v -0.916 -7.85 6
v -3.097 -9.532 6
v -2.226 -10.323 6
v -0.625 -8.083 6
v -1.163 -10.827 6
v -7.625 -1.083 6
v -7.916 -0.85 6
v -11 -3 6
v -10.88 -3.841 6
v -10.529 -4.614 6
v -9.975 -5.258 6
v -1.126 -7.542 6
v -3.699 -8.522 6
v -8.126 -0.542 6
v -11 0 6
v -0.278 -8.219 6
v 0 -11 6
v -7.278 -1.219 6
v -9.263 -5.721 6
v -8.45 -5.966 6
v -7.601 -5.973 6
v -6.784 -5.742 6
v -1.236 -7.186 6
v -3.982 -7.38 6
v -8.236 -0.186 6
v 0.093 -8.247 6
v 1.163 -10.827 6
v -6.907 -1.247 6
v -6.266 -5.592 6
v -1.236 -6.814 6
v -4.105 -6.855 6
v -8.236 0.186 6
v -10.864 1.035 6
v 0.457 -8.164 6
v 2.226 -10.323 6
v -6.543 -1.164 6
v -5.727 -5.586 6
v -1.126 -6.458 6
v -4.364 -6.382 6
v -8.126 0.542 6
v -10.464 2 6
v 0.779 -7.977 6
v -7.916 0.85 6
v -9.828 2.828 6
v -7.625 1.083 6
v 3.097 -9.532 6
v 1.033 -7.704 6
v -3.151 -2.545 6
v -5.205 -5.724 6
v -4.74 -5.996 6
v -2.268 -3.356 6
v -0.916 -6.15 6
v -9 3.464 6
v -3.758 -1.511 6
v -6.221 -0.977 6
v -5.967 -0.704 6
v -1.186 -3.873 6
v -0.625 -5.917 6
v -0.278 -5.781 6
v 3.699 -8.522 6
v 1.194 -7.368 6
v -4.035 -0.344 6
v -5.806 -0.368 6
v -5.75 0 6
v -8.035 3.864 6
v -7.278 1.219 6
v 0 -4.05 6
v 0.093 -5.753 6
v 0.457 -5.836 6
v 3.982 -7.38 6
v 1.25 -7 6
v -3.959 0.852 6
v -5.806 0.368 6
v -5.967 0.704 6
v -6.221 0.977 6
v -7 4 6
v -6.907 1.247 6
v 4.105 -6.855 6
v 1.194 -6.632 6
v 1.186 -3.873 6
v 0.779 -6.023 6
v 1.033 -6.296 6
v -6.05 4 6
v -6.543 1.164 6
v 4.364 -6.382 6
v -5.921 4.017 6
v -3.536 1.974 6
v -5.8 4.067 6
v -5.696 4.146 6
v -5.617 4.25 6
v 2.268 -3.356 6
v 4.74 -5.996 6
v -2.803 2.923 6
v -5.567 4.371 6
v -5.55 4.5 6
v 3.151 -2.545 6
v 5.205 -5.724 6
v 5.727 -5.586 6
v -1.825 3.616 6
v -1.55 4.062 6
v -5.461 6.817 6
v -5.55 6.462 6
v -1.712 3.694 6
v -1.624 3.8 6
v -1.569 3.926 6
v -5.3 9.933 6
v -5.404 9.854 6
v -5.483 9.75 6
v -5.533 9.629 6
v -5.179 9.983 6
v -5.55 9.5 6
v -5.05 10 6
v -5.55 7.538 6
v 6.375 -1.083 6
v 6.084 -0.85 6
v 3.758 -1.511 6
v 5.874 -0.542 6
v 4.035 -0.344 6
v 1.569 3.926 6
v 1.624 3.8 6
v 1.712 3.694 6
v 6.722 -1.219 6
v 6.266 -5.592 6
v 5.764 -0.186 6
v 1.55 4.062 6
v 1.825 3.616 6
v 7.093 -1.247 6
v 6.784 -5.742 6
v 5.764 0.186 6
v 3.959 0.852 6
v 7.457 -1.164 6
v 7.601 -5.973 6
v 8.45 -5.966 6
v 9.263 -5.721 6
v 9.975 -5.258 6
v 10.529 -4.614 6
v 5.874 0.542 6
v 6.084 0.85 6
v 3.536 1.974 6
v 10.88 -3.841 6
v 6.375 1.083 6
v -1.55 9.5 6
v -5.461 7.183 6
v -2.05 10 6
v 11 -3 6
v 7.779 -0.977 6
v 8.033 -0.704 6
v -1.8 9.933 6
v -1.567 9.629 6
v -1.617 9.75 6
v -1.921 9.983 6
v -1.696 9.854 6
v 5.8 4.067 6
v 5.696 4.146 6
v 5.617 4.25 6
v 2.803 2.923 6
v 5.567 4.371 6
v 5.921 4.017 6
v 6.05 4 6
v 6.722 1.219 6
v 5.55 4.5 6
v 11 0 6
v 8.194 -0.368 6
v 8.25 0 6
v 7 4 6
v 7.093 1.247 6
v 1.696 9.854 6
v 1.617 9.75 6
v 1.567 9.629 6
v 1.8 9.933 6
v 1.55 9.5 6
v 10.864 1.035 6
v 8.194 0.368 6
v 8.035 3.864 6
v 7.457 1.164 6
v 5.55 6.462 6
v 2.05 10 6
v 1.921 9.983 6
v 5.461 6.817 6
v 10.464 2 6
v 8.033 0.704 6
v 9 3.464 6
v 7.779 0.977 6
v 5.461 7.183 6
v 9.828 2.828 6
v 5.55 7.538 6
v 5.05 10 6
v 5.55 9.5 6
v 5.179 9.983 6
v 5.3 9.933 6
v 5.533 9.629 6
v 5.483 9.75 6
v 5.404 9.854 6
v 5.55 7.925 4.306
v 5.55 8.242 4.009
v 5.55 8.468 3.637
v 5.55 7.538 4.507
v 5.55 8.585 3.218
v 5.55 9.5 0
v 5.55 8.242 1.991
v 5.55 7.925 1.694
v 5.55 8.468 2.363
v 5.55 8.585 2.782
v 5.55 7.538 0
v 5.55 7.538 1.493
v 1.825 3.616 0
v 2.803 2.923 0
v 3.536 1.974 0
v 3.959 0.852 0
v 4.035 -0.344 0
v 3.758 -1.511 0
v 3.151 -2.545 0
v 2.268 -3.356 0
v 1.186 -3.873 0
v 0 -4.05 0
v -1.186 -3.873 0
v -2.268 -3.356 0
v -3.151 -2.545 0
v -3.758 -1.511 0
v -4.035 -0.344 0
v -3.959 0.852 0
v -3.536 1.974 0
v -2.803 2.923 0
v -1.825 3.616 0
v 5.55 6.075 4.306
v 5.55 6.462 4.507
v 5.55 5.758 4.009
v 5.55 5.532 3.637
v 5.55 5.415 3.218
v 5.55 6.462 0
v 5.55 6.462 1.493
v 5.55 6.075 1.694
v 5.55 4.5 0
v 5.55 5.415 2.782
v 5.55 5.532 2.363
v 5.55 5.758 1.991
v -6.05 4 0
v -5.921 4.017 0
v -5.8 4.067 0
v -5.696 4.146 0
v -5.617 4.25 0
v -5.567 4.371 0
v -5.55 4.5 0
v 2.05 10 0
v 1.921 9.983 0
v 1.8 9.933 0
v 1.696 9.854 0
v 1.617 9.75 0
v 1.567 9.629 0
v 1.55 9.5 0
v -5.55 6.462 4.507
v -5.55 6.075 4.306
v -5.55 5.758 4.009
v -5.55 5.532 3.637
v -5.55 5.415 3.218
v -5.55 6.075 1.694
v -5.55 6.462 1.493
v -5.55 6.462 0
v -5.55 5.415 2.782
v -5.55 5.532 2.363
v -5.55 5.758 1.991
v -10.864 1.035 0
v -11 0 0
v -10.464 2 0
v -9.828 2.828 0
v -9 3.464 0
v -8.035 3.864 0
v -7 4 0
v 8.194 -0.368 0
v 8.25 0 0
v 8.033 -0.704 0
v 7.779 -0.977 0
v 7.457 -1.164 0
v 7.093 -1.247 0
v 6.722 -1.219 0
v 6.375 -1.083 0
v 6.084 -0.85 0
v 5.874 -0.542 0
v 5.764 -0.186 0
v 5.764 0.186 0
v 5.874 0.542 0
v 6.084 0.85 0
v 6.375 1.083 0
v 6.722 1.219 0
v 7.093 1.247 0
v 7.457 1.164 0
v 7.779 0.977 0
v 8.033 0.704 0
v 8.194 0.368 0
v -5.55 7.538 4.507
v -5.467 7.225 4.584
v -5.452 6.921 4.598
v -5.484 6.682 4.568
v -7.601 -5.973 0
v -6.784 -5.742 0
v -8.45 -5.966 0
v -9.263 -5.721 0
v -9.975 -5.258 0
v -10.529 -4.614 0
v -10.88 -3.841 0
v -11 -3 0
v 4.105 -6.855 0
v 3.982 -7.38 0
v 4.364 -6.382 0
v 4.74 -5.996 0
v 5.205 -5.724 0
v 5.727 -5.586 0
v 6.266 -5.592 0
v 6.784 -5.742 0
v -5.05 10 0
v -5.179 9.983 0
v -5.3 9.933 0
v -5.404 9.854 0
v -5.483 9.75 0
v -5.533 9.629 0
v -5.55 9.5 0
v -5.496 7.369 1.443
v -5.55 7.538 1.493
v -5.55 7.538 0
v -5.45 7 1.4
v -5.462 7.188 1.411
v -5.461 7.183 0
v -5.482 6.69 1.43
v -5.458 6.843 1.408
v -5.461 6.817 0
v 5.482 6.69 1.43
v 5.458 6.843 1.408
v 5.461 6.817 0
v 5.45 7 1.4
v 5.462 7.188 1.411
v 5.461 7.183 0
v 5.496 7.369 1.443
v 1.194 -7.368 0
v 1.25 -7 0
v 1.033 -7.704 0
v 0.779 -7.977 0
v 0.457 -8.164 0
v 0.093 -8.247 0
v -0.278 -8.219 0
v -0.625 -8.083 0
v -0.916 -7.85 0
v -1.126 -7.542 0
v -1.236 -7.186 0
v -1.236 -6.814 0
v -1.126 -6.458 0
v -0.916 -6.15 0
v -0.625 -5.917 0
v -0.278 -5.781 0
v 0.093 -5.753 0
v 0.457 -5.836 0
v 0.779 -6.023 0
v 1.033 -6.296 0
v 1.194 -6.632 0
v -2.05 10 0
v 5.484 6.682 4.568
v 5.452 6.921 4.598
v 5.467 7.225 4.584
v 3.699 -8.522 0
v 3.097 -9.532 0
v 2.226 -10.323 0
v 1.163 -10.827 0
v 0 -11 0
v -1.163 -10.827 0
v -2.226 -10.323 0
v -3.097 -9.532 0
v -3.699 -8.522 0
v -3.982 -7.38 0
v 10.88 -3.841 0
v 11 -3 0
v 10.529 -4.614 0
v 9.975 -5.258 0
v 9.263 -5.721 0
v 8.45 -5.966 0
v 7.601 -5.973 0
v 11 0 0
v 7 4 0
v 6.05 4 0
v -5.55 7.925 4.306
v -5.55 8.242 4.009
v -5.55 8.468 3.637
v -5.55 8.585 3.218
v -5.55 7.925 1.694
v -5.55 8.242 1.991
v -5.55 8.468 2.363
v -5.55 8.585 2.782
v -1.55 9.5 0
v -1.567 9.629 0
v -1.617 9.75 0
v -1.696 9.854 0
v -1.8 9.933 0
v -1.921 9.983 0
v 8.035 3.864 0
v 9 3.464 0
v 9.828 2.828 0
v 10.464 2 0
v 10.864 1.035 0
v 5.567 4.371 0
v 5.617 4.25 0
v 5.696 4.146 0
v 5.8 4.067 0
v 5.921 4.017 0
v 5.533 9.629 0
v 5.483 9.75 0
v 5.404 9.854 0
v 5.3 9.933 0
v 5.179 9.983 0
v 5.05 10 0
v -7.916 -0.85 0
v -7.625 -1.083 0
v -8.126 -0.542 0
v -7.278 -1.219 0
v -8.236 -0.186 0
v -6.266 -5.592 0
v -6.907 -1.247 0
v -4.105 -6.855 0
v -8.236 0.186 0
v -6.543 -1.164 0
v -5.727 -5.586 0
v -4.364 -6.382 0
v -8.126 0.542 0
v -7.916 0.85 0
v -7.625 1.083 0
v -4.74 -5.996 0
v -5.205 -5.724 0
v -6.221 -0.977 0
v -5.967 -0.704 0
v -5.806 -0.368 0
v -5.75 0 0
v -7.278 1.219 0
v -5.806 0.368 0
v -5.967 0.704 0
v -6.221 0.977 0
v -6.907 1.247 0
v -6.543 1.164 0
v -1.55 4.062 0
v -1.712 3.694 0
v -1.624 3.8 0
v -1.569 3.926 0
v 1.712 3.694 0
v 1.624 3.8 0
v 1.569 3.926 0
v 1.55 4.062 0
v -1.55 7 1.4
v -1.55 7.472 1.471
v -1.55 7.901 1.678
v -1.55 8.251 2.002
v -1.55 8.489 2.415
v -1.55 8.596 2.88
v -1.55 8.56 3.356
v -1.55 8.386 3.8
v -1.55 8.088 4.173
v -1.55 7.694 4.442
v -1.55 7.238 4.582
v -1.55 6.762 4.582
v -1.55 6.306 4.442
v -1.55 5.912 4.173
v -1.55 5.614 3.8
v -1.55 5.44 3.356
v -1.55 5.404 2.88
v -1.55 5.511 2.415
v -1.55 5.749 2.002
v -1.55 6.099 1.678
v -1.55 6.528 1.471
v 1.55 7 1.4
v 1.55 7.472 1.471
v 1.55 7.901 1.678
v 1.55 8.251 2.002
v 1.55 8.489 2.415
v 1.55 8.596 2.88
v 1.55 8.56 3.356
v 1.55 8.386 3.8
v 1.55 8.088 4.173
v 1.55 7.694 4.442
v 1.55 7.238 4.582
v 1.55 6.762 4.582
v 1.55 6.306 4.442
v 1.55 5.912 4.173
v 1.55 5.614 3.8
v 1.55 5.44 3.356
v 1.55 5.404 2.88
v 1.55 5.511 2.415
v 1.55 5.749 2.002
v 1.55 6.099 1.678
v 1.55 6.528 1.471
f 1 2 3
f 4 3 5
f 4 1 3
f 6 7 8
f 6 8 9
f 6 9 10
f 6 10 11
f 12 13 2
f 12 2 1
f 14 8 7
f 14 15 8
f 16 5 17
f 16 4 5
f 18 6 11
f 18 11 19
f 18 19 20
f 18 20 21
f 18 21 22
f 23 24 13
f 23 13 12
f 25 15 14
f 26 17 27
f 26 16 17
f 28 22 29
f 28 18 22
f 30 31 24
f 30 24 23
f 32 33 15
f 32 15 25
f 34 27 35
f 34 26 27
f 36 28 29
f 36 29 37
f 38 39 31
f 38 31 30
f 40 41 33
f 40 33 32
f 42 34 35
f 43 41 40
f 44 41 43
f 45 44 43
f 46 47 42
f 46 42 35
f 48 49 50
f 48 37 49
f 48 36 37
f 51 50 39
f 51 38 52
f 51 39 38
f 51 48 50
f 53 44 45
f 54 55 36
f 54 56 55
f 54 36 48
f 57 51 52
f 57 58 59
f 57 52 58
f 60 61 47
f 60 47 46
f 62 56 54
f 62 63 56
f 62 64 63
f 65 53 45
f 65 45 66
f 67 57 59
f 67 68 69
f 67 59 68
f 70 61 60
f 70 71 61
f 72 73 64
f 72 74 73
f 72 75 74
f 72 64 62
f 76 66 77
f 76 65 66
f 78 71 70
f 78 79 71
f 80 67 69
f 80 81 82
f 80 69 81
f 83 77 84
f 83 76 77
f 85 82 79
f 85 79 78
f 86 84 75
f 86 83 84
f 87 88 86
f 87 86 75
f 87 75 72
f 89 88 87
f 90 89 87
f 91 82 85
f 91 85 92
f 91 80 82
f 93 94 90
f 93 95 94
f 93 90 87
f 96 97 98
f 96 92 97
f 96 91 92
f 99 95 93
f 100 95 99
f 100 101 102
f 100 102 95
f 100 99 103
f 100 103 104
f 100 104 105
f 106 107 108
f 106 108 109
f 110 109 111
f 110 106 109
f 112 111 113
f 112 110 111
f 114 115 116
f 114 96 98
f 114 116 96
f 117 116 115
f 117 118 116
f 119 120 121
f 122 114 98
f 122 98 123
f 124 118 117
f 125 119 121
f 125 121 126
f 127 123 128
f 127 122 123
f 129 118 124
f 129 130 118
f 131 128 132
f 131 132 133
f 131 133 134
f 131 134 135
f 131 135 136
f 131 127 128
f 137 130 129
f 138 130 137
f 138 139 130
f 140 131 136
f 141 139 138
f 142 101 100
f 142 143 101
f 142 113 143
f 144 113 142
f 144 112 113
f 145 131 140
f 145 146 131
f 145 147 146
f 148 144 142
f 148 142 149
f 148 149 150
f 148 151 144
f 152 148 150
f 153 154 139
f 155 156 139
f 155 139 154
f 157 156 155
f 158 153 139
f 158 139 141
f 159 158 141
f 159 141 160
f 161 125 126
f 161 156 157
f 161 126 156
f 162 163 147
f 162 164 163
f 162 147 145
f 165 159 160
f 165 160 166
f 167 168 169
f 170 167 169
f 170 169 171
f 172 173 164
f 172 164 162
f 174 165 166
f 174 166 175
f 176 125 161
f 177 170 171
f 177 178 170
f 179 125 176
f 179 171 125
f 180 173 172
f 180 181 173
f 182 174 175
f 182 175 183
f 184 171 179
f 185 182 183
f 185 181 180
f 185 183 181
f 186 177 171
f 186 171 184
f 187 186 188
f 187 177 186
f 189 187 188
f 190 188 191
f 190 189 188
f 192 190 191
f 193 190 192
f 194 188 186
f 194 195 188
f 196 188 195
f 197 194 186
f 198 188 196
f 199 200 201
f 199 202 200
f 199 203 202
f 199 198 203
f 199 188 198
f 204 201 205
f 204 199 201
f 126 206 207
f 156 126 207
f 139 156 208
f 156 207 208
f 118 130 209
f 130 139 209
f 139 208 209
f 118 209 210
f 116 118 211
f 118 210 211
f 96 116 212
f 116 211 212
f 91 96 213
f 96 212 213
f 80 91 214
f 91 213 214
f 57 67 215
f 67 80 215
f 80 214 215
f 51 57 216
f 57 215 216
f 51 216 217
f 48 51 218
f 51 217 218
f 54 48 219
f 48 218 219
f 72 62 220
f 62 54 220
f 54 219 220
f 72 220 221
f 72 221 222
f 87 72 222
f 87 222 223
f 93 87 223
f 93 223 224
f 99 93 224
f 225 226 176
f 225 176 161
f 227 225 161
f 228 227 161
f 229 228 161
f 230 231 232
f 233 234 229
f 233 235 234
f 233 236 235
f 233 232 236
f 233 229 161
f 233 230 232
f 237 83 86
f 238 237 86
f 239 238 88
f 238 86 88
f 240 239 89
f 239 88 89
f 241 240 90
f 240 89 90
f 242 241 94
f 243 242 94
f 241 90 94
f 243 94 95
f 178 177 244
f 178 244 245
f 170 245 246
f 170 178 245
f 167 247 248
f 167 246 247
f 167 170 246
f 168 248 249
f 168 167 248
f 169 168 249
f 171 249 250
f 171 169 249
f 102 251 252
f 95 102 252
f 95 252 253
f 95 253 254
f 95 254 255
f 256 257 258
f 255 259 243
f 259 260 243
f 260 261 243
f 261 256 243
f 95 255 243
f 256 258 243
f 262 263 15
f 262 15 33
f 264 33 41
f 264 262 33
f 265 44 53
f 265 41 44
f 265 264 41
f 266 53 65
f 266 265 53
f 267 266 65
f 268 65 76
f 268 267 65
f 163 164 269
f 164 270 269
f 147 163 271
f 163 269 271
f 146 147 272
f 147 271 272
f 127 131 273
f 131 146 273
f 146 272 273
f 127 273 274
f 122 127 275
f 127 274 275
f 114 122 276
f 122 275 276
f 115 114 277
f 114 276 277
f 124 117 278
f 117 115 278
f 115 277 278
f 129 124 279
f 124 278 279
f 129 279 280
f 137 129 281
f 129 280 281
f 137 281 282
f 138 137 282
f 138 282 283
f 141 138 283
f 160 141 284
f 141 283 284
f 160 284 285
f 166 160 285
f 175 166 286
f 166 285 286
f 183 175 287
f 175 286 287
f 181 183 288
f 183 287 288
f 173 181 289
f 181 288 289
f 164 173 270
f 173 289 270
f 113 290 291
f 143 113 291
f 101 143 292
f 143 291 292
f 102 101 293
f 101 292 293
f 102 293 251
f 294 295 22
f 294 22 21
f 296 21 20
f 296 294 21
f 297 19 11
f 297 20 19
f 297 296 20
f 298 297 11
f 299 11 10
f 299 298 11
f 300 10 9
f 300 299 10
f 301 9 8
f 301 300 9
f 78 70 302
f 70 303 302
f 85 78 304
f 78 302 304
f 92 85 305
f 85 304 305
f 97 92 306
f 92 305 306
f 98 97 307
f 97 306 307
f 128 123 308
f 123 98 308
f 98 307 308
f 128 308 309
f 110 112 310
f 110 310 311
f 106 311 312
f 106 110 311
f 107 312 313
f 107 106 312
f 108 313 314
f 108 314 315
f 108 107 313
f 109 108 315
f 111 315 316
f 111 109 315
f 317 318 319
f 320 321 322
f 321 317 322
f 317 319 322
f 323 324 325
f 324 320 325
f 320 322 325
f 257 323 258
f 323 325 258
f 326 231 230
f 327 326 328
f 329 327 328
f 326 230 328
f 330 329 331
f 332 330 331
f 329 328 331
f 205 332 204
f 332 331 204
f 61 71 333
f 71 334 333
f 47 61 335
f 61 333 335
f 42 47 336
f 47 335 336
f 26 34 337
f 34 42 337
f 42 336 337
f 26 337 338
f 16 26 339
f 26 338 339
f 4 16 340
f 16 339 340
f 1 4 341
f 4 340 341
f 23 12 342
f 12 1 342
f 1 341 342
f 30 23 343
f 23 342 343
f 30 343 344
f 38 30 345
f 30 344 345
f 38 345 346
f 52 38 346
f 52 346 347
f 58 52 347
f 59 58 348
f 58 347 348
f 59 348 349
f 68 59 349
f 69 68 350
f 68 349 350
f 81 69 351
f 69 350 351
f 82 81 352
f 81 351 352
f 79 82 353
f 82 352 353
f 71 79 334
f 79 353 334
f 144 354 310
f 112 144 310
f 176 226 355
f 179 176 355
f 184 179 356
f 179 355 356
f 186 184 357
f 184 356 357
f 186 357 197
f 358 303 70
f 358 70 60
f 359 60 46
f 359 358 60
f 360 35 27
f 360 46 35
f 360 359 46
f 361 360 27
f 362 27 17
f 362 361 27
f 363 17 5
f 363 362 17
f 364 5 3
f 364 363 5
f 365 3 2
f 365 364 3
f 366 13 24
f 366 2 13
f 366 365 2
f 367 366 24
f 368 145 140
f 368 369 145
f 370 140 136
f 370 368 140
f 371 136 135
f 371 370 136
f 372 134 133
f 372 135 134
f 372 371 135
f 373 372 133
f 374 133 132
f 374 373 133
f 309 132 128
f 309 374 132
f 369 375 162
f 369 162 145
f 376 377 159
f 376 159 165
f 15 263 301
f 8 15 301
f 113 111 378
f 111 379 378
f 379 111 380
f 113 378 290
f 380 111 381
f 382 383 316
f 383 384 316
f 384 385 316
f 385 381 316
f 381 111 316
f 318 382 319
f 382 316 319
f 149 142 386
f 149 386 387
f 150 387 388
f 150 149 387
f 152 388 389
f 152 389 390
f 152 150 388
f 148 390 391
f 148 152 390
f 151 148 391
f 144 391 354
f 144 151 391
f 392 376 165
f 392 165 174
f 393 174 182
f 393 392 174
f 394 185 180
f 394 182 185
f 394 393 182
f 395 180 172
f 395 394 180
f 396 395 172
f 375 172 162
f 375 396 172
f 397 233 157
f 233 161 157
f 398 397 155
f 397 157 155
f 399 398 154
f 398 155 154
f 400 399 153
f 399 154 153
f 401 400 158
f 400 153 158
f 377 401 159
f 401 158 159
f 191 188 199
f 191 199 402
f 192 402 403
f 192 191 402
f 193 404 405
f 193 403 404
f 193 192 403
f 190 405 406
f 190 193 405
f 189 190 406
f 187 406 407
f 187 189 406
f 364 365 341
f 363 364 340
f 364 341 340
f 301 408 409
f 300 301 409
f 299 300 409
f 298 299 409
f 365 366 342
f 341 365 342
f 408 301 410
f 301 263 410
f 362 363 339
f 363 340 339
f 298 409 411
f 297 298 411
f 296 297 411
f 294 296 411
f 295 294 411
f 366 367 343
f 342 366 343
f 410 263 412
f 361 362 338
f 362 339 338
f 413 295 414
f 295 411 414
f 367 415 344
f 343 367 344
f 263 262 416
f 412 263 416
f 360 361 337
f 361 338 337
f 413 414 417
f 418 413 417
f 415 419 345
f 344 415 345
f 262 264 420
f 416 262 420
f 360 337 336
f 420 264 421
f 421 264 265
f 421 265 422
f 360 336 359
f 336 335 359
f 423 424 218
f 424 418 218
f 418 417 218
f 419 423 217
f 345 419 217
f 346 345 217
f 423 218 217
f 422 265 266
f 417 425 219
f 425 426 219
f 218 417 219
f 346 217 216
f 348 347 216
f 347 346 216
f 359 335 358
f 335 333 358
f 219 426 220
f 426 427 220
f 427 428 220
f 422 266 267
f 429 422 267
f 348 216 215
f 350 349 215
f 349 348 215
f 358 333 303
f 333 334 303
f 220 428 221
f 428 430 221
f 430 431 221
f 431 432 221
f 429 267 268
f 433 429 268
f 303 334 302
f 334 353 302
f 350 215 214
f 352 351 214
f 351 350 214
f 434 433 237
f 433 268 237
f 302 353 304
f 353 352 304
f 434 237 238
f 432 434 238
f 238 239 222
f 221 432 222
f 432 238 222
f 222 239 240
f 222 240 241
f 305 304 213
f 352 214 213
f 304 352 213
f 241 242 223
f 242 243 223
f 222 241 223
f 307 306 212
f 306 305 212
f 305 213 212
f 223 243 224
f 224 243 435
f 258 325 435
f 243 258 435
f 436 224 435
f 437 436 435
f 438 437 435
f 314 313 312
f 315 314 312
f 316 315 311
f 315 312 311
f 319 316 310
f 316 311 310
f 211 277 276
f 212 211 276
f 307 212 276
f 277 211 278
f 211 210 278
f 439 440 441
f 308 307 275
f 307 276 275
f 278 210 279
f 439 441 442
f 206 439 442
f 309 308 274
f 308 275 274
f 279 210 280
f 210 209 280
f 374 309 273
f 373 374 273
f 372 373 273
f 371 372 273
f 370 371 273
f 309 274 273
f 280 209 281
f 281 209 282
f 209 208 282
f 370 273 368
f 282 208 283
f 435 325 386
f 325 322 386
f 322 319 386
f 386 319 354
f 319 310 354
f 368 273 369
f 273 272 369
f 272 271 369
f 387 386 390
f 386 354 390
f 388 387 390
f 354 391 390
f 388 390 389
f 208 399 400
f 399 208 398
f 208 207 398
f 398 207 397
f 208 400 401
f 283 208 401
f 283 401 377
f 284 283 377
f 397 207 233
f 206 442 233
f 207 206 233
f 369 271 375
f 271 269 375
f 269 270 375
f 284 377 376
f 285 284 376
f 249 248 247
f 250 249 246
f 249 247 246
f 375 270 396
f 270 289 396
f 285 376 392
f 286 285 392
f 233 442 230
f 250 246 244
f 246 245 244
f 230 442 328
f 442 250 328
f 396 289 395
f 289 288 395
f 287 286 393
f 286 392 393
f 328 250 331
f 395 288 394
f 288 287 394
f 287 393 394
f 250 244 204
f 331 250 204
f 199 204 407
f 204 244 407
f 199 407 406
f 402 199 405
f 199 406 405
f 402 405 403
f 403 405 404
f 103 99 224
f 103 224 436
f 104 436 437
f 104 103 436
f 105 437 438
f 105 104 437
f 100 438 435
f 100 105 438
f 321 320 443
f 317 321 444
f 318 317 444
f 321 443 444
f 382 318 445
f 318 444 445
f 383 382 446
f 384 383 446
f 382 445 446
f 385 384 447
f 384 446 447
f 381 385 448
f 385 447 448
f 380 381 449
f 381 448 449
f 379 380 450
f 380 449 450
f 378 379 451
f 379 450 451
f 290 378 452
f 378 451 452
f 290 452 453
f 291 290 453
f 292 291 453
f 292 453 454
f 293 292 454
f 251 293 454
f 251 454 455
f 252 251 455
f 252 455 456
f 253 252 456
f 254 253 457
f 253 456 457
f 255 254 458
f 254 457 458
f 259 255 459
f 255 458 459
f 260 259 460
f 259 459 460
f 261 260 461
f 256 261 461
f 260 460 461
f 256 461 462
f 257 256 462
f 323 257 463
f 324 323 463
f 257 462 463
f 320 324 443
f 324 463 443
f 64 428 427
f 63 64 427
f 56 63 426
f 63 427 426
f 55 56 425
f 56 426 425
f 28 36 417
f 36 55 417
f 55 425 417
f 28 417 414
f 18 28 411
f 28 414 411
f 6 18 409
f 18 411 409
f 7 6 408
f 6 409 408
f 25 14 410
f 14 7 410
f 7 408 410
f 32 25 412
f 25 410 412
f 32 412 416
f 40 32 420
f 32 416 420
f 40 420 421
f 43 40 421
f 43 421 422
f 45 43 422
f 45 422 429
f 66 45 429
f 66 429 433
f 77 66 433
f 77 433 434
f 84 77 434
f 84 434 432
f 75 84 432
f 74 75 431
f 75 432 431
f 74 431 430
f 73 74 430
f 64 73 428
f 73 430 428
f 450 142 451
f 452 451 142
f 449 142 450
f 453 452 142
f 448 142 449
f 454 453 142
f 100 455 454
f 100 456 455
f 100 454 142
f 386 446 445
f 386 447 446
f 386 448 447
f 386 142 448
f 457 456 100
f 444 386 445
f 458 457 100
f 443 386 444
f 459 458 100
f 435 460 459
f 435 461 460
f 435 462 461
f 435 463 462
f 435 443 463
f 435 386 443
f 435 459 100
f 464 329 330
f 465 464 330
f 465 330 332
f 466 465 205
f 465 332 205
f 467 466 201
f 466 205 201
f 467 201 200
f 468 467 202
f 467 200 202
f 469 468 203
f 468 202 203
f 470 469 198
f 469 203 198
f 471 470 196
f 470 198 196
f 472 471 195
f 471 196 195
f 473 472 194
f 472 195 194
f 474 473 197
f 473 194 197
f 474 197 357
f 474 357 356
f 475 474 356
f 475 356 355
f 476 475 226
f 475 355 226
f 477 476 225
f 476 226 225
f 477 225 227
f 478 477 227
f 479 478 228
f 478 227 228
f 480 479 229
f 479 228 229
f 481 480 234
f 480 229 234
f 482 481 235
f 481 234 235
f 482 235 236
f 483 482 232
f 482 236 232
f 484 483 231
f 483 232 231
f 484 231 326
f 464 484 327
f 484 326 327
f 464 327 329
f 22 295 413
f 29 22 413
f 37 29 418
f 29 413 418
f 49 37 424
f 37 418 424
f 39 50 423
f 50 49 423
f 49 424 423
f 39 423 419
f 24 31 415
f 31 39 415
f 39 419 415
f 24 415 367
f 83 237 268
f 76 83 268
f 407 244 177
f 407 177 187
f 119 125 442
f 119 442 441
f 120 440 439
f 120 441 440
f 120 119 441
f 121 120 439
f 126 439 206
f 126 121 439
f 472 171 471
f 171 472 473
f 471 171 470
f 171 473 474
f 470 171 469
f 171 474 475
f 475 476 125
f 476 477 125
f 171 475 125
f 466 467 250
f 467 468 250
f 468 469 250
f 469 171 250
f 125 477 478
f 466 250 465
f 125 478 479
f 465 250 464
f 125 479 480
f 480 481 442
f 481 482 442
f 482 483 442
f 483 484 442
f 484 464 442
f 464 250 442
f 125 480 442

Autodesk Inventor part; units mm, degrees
ref_plane "YZ Plane" through (0, 0, 0) normal (1, 0, 0) x (0, 1, 0)
ref_plane "XZ Plane" through (0, 0, 0) normal (0, 1, 0) x (-1, 0, 0)
ref_plane "XY Plane" through (0, 0, 0) normal (0, 0, 1) x (1, 0, 0)
sketch "スケッチ1" plane through (0, 0, 0) normal (0, 0, 1) x (1, 0, 0)
  arc A0 (-1.55, 3.7417) -> (1.55, 3.7417) centre (0, 0) ccw
  circle A1 centre (-7, 0) radius 1.25
  circle A2 centre (7, 0) radius 1.25
  arc A3 (-7, 4) -> (-11, 0) centre (-7, 0) ccw
  arc A4 (11, 0) -> (7, 4) centre (7, 0) ccw
  line L0 (-1.55, 10) -> (-1.55, 3.7417)
  line L1 (1.55, 10) -> (1.55, 3.7417)
  circle A5 centre (0, -7) radius 1.25
  line L2 (1.55, 10) -> (5.55, 10)
  line L3 (5.55, 10) -> (5.55, 7.5385)
  line L4 (5.55, 4) -> (7, 4)
  line L5 (-1.55, 10) -> (-5.55, 10)
  line L6 (-5.55, 10) -> (-5.55, 7.5385)
  line L7 (-5.55, 4) -> (-7, 4)
  line L8 (-11, 0) -> (-11, -3)
  arc A6 (-11, -3) -> (-6.7837, -5.7424) centre (-8, -3) ccw
  arc A7 (1.55, 3.7417) -> (-1.55, 3.7417) centre (0, 0) ccw construction
  arc A8 (-3.9819, -7.3804) -> (3.9819, -7.3804) centre (0, -7) ccw
  arc A9 (-3.9819, -7.3804) -> (-6.7837, -5.7424) centre (-5.9728, -7.5706) ccw
  line L9 (11, 0) -> (11, -3)
  arc A10 (6.7837, -5.7424) -> (11, -3) centre (8, -3) ccw
  arc A11 (6.7837, -5.7424) -> (3.9819, -7.3804) centre (5.9728, -7.5706) ccw
  arc A12 (-5.55, 7.5385) -> (-5.55, 6.4615) centre (-6.95, 7) ccw construction
  arc A13 (5.55, 6.4615) -> (5.55, 7.5385) centre (6.95, 7) ccw construction
  arc A14 (-5.55, 6.4615) -> (-5.55, 7.5385) centre (-6.95, 7) ccw
  arc A15 (5.55, 7.5385) -> (5.55, 6.4615) centre (6.95, 7) ccw
  line L10 (5.55, 6.4615) -> (5.55, 4)
  line L11 (5.55, 7.5385) -> (5.55, 6.4615) construction
  line L12 (-5.55, 6.4615) -> (-5.55, 4)
  line L13 (-5.55, 7.5385) -> (-5.55, 6.4615) construction
  dimension "d0" = 8.1
  dimension "d1" = 2.5
  dimension "d2" = 2.5
  dimension "d4" = 7
  dimension "d5" = 7
  dimension "d6" = 2.5
  dimension "d7" = 7
  dimension "d8" = 6
  dimension "d9" = 4
  dimension "d10" = 3.1
  dimension "d11" = 4
  dimension "d12" = 4
  dimension "d13" = 1.55
  dimension "d14" = 3
  dimension "d15" = 3
  dimension "d16" = 4
  dimension "d17" = 4
  dimension "d18" = 3
  dimension "d19" = 3
  dimension "d20" = 2
  dimension "d21" = 2
  dimension "d22" = 3
  dimension "d23" = 3
  dimension "d24" = 1.4
  dimension "d25" = 1.4
  dimension "d26" = 3
  dimension "d27" = 3
extrude "押し出し1" add sketch "スケッチ1" along normal blind 6
sketch "スケッチ2" plane through (5.55, 4, 0) normal (1, 0, 0) x (0, 0, -1)
  circle A0 centre (-3, 3) radius 1.6
  line L0 (0, 6) -> (-6, 6) projected
  point P0 (0, -4)
  dimension "d30" = 3.2
  dimension "d31" = 3
  dimension "d32" = 3
extrude "押し出し2" cut sketch "スケッチ2" against normal through all
fillet "フィレット1" radius 0.5 8 edges at (-5.55, 10, 3) (-1.55, 10, 3) (1.55, 10, 3) (5.55, 10, 3) (5.55, 4, 3) (-5.55, 4, 3) (-1.55, 3.7417, 3) (1.55, 3.7417, 3)
properties part number "カップリング_軸8mm_2.5mm"
